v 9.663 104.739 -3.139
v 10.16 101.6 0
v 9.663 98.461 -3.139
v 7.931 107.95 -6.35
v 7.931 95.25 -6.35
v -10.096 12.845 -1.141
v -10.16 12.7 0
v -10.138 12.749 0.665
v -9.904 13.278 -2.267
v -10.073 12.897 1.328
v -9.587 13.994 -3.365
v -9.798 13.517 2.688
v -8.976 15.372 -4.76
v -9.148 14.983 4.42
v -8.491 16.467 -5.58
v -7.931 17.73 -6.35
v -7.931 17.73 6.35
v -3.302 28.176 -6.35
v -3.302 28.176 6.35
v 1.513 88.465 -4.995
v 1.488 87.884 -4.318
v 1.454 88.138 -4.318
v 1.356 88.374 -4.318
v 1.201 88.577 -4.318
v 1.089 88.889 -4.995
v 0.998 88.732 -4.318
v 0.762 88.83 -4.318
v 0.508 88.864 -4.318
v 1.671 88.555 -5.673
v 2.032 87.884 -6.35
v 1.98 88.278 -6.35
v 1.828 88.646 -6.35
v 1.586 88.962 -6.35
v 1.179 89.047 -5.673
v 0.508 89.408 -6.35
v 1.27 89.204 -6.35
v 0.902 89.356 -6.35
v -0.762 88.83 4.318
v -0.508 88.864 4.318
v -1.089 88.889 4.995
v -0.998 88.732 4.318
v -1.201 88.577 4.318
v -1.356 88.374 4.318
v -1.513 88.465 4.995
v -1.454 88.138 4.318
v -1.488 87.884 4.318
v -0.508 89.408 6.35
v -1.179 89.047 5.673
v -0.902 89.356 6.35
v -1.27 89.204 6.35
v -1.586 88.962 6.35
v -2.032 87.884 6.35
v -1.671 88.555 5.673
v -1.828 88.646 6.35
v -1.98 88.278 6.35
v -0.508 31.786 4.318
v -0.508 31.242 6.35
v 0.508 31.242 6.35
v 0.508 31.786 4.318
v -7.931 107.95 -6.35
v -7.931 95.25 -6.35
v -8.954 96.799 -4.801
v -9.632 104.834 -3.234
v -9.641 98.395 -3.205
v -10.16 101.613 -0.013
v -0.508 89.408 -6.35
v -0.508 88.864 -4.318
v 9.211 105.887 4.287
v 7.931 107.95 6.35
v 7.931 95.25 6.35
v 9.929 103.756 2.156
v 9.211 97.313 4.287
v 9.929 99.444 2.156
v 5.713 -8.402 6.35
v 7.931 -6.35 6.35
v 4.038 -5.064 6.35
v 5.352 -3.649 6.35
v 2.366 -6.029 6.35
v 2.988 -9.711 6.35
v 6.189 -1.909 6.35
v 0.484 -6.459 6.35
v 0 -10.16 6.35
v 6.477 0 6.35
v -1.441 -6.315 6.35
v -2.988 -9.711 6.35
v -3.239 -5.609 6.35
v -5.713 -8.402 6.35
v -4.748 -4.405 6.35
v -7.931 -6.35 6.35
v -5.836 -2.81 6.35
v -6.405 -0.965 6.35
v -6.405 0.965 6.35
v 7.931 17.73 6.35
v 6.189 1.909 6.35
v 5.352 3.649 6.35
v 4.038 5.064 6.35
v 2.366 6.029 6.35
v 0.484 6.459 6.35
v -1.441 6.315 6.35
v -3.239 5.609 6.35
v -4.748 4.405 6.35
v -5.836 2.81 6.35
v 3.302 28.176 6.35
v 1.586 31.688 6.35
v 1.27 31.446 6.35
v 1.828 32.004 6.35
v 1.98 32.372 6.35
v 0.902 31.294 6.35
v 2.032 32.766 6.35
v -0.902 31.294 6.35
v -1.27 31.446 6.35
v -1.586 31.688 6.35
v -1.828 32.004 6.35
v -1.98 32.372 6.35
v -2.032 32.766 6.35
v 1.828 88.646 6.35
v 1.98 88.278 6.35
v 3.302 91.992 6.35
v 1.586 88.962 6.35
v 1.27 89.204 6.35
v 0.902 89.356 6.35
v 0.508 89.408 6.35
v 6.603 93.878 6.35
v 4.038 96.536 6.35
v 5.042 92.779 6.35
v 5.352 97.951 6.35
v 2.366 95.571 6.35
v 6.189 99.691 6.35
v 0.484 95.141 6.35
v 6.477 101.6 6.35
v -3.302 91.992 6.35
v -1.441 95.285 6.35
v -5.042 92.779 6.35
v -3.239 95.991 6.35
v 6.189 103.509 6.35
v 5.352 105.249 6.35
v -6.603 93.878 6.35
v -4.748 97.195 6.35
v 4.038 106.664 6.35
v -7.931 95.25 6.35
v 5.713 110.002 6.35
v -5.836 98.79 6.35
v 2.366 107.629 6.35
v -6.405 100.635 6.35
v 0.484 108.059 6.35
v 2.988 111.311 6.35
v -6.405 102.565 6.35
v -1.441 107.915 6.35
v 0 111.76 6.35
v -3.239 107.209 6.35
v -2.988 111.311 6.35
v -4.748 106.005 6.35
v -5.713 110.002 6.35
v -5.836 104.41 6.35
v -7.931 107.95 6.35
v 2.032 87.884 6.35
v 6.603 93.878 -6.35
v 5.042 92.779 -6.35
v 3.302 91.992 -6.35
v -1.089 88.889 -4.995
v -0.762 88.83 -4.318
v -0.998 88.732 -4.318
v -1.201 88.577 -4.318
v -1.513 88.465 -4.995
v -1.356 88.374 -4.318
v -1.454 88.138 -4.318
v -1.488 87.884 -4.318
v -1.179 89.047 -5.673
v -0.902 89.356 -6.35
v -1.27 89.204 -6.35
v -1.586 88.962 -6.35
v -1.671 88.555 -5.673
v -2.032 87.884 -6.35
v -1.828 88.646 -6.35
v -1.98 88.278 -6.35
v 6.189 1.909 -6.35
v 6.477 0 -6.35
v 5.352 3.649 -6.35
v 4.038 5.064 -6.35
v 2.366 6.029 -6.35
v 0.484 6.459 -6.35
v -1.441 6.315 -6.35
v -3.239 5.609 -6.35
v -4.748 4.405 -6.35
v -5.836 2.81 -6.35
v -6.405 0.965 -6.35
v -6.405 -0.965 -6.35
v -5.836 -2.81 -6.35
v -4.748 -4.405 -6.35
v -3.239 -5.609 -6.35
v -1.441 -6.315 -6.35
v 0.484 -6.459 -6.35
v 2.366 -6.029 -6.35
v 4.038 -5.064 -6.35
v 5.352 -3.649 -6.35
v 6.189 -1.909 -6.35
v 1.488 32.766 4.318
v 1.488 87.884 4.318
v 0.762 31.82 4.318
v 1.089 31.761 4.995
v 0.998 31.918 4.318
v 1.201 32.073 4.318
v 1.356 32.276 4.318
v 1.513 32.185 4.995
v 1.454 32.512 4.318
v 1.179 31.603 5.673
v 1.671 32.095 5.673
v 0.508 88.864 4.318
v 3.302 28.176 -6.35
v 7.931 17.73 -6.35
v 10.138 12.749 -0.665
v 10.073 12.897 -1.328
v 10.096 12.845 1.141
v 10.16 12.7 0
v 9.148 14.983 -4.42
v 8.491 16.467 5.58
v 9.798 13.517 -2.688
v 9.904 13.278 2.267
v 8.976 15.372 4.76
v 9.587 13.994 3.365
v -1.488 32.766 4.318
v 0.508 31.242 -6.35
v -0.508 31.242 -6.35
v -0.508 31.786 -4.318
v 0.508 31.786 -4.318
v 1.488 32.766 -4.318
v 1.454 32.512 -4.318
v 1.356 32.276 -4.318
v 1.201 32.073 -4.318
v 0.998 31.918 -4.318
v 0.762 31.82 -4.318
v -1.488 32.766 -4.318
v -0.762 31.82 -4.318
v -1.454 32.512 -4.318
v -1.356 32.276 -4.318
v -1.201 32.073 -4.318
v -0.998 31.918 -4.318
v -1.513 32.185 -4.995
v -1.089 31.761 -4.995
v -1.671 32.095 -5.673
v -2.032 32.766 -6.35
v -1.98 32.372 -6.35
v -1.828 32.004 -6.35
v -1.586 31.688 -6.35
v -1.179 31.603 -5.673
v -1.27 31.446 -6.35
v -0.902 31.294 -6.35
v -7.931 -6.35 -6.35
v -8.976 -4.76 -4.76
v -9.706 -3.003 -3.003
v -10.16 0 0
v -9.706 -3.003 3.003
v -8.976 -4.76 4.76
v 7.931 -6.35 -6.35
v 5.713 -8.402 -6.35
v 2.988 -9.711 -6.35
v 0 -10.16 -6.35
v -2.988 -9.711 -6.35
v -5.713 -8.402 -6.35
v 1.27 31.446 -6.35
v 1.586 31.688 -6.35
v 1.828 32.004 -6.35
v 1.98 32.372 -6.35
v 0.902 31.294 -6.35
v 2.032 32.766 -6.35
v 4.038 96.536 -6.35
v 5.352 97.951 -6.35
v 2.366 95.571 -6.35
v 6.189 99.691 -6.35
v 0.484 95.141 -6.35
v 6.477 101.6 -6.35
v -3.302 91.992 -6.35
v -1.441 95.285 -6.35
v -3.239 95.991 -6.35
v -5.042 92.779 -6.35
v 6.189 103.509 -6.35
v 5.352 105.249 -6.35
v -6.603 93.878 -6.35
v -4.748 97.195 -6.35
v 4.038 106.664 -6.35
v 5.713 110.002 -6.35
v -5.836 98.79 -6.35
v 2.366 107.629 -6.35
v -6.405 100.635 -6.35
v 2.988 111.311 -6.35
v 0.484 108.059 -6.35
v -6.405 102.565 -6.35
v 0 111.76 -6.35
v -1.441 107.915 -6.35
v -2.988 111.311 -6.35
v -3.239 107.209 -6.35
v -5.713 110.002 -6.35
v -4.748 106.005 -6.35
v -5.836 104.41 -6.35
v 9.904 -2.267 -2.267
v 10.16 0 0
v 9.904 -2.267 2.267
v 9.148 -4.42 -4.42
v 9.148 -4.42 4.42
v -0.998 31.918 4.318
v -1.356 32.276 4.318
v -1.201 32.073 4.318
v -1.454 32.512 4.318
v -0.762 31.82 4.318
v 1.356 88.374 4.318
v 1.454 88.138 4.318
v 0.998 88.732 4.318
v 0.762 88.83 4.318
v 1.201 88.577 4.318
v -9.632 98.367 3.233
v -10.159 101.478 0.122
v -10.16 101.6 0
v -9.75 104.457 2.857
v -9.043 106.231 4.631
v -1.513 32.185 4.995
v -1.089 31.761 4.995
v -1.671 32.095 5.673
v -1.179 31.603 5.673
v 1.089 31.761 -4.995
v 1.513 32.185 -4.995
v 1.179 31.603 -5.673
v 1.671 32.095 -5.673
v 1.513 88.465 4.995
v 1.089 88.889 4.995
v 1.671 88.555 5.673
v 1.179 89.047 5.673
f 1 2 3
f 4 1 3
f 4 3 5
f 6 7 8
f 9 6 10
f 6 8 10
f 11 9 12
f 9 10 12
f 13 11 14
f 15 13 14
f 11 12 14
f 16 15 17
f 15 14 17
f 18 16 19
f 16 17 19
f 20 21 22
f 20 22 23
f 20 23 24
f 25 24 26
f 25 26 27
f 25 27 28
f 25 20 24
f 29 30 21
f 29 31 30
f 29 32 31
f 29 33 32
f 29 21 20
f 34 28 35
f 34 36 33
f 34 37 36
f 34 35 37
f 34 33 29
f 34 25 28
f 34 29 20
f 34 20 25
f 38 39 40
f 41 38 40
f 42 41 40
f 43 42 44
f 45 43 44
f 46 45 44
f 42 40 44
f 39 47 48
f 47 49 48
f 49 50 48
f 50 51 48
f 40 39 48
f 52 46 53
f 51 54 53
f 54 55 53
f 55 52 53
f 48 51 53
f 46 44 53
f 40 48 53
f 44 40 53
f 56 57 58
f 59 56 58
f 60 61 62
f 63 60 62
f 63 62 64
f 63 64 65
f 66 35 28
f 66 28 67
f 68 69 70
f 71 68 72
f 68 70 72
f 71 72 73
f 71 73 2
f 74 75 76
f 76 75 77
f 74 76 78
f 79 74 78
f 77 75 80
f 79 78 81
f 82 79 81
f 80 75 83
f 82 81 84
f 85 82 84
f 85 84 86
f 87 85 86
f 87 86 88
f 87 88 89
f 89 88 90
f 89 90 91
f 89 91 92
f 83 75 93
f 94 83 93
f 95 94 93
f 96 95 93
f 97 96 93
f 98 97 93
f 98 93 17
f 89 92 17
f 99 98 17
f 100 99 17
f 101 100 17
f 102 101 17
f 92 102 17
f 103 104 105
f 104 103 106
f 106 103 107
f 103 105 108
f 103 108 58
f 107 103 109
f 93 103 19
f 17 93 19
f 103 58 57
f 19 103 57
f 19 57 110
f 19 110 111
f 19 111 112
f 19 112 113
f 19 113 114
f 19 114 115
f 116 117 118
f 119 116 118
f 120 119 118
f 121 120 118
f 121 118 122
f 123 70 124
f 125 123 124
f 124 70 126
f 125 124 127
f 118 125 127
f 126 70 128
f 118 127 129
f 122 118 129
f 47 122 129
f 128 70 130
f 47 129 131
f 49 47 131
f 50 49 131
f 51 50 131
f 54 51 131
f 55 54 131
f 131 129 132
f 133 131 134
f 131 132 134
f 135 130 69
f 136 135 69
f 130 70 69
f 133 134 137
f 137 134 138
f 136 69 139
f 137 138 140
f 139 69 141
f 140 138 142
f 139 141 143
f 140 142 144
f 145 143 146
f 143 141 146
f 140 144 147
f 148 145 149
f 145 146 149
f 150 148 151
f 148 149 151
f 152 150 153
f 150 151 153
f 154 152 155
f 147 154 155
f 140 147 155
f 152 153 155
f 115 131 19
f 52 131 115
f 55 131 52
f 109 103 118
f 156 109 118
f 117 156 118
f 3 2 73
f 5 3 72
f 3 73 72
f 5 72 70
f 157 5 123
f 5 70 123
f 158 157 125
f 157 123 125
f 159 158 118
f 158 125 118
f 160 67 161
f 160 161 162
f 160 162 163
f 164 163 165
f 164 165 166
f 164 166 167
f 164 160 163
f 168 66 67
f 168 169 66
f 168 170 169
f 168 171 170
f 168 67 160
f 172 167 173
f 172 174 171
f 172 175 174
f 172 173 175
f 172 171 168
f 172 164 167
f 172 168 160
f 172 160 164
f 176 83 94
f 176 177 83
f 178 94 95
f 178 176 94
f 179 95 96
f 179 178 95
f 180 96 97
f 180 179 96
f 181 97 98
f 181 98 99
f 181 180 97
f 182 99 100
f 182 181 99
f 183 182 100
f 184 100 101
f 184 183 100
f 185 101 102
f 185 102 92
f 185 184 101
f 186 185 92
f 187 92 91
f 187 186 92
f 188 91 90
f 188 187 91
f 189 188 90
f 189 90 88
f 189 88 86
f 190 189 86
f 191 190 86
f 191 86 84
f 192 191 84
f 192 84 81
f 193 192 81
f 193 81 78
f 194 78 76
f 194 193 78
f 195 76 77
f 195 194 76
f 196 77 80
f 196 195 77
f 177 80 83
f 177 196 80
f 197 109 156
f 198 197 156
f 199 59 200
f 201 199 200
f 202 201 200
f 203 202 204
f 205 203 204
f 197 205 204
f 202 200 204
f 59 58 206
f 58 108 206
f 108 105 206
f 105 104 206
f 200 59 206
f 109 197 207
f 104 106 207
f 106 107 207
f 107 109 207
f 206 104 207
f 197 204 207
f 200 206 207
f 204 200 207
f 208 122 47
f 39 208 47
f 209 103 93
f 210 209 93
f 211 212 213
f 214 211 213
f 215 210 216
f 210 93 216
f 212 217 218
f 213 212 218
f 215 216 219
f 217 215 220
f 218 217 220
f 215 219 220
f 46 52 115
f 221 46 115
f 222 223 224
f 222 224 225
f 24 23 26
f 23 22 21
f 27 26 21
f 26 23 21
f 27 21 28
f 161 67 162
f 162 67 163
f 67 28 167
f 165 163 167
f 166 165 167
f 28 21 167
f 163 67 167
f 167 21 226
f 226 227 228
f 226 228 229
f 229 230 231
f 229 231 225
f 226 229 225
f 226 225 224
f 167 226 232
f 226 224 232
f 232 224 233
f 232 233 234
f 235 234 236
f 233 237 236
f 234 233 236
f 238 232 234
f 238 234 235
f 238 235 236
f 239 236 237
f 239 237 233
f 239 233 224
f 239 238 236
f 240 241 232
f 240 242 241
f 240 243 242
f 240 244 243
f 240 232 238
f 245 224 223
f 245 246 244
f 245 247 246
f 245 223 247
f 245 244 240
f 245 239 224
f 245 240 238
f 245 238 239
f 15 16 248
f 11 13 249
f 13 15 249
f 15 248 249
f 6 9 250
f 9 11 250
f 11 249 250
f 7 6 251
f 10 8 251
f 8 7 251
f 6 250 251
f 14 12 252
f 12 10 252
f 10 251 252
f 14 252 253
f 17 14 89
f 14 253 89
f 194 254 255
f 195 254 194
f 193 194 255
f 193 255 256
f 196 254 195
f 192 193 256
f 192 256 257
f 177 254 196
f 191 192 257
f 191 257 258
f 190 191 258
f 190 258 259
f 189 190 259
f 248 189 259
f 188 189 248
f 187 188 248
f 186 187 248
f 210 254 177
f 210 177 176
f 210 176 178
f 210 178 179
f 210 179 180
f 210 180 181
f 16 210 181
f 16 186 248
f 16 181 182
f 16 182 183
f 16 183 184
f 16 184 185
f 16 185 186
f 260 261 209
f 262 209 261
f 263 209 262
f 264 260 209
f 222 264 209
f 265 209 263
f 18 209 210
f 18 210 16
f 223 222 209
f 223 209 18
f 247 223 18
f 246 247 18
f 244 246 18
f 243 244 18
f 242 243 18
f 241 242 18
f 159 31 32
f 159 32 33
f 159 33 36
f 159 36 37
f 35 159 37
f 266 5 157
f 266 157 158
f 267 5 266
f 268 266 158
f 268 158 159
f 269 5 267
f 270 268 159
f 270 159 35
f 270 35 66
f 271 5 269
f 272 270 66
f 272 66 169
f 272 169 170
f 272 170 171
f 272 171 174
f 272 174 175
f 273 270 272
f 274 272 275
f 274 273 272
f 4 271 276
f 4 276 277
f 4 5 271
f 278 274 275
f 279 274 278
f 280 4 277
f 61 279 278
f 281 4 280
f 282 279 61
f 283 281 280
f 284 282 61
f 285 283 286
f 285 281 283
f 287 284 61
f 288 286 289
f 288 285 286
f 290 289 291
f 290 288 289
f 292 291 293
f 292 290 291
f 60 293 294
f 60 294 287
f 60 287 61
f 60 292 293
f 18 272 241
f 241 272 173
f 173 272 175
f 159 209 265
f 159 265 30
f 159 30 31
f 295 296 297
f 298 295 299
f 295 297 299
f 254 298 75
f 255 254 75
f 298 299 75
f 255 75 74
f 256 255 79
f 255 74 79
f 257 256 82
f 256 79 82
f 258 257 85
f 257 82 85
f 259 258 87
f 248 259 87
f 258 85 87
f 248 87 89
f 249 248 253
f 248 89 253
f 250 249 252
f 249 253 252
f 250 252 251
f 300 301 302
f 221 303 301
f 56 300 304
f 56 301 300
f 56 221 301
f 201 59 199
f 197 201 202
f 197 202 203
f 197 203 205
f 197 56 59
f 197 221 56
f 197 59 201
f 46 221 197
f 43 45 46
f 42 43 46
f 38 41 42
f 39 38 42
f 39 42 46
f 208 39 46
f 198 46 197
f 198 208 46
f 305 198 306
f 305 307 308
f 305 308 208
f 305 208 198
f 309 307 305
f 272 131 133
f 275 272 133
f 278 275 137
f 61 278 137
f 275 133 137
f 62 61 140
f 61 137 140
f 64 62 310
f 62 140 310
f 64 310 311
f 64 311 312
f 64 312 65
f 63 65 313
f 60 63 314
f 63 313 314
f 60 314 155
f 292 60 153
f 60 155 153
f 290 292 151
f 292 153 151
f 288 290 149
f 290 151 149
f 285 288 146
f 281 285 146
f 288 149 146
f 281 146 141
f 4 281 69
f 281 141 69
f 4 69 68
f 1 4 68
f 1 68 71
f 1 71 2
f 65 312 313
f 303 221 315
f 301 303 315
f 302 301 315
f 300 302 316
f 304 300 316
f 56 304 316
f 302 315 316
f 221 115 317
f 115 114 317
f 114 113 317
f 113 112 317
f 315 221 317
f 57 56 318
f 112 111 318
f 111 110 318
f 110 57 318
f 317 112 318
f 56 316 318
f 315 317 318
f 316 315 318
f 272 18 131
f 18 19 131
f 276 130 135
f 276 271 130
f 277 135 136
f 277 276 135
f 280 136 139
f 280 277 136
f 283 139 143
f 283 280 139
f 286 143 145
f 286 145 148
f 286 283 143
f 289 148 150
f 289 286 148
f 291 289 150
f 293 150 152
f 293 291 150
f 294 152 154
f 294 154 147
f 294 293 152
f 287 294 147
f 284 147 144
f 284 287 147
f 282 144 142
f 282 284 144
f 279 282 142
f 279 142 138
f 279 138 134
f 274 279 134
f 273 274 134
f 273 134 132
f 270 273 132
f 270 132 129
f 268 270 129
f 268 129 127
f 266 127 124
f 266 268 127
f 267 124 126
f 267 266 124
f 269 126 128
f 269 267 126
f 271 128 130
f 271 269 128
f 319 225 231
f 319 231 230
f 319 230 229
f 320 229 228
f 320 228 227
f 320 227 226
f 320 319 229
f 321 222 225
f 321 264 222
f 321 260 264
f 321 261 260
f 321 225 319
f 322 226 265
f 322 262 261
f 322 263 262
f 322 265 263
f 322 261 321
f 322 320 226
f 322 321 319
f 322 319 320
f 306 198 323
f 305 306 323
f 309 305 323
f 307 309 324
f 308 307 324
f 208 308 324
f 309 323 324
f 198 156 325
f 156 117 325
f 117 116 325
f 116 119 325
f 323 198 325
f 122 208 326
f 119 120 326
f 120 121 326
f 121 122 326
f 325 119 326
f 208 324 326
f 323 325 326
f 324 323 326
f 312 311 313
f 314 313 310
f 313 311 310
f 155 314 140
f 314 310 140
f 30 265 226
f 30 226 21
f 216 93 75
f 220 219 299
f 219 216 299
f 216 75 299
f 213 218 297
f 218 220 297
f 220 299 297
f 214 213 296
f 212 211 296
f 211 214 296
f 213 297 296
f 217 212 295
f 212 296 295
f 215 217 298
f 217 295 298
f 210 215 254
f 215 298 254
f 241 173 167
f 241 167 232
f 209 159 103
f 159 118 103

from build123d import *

# Parameters (mm, degrees)
SKETCH1_R               = 6.477
BOSS_EXTRUDE1_DEPTH     = 6.35
CUT_EXTRUDE4_START      = 6.35
CUT_EXTRUDE4_DEPTH      = 2.032
CUT_EXTRUDE4_DRAFT      = -15
MIRROR1_START           = 6.35
MIRROR1_COPY_1_DEPTH    = 2.032
MIRROR1_COPY_1_DRAFT    = -15
CUT_EXTRUDE5_DEPTH      = 113.400381227
CUT_EXTRUDE5_DEPTH_BACK = 113.400381227
SKETCH3_OUTSIDE_W       = 47.17
SKETCH3_OUTSIDE_H       = 39.55
SKETCH3_OUTSIDE_R       = 10.16


with BuildPart() as part:
    # Sketch1 → Boss-Extrude1 (new, symmetric)
    with BuildSketch(Plane.XY):
        with BuildLine():
            Line((-10.16, 0), (-10.16, 12.7))
            Line((-10.16, 12.7), (-3.302, 28.175956627))
            Line((-3.302, 28.175956627), (-3.302, 91.991545598))
            ThreePointArc((-3.302, 91.991545598), (0, 111.76), (3.302, 91.991545598))
            Line((3.302, 91.991545598), (3.302, 28.175956627))
            Line((3.302, 28.175956627), (10.16, 12.7))
            Line((10.16, 12.7), (10.16, 0))
            ThreePointArc((10.16, 0), (0, -10.16), (-10.16, 0))
        make_face()
        Circle(SKETCH1_R, mode=Mode.SUBTRACT)
        with Locations((0, 101.6)):
            Circle(SKETCH1_R, mode=Mode.SUBTRACT)
    extrude(amount=BOSS_EXTRUDE1_DEPTH, both=True)


with BuildPart() as cut_extrude4_tool:
    # Sketch2 → Cut-Extrude4 (with draft: the straight prism first)
    with BuildSketch(Plane.XY.offset(CUT_EXTRUDE4_START)):
        with BuildLine():
            ThreePointArc((0.508, 31.242), (1.585630735, 31.688369265), (2.032, 32.766))
            Line((2.032, 32.766), (2.032, 87.884))
            ThreePointArc((2.032, 87.884), (1.585630735, 88.961630735), (0.508, 89.408))
            Line((0.508, 89.408), (-0.508, 89.408))
            ThreePointArc((-0.508, 89.408), (-1.585630735, 88.961630735), (-2.032, 87.884))
            Line((-2.032, 87.884), (-2.032, 32.766))
            ThreePointArc((-2.032, 32.766), (-1.585630735, 31.688369265), (-0.508, 31.242))
            Line((-0.508, 31.242), (0.508, 31.242))
        make_face()
    extrude(amount=-CUT_EXTRUDE4_DEPTH)
    # Cut-Extrude4: the draft: its side faces are tilted about the plane it starts from
    cut_extrude4_sides = [cut_extrude4_tool.faces().sort_by_distance(p)[0] for p in [
        (-1.585630735, 31.688369265, 5.334),
        (0, 31.242, 5.334),
        (1.585630735, 31.688369265, 5.334),
        (2.032, 60.325, 5.334),
        (1.585630735, 88.961630735, 5.334),
        (0, 89.408, 5.334),
        (-1.585630735, 88.961630735, 5.334),
        (-2.032, 60.325, 5.334),
    ]]
    draft(cut_extrude4_sides, Plane.XY.offset(CUT_EXTRUDE4_START), CUT_EXTRUDE4_DRAFT)


with BuildPart() as part_1:
    add(part.part)

    # Cut-Extrude4: cut by cut_extrude4_tool
    add(cut_extrude4_tool.part, mode=Mode.SUBTRACT)


with BuildPart() as mirror1_copy_1_tool:
    # Mirror1 copy 1 sketch → Mirror1 copy 1 (with draft: the straight prism first)
    with BuildSketch(Plane(origin=(0, 0, 0), x_dir=(1, 0, 0), z_dir=(0, 0, -1)).offset(MIRROR1_START)):
        with BuildLine():
            ThreePointArc((0.508, -31.242), (1.585630735, -31.688369265), (2.032, -32.766))
            Line((2.032, -32.766), (2.032, -87.884))
            ThreePointArc((2.032, -87.884), (1.585630735, -88.961630735), (0.508, -89.408))
            Line((0.508, -89.408), (-0.508, -89.408))
            ThreePointArc((-0.508, -89.408), (-1.585630735, -88.961630735), (-2.032, -87.884))
            Line((-2.032, -87.884), (-2.032, -32.766))
            ThreePointArc((-2.032, -32.766), (-1.585630735, -31.688369265), (-0.508, -31.242))
            Line((-0.508, -31.242), (0.508, -31.242))
        make_face()
    extrude(amount=-MIRROR1_COPY_1_DEPTH)
    # Mirror1 copy 1: the draft: its side faces are tilted about the plane it starts from
    mirror1_copy_1_sides = [mirror1_copy_1_tool.faces().sort_by_distance(p)[0] for p in [
        (-1.585630735, 31.688369265, -5.334),
        (0, 31.242, -5.334),
        (1.585630735, 31.688369265, -5.334),
        (2.032, 60.325, -5.334),
        (1.585630735, 88.961630735, -5.334),
        (0, 89.408, -5.334),
        (-1.585630735, 88.961630735, -5.334),
        (-2.032, 60.325, -5.334),
    ]]
    draft(mirror1_copy_1_sides, Plane(origin=(0, 0, 0), x_dir=(1, 0, 0), z_dir=(0, 0, -1)).offset(MIRROR1_START), MIRROR1_COPY_1_DRAFT)


with BuildPart() as part_2:
    add(part_1.part)

    # Mirror1 copy 1: cut by mirror1_copy_1_tool
    add(mirror1_copy_1_tool.part, mode=Mode.SUBTRACT)

    # Sketch3 outside → Cut-Extrude5 (cut, two sides: drawn at the far end of the back side and taken through both)
    with BuildSketch(Plane(origin=(0, 0, 0), x_dir=(1, 0, 0), z_dir=(0, 1, 0)).offset(-CUT_EXTRUDE5_DEPTH_BACK)):
        Rectangle(SKETCH3_OUTSIDE_W, SKETCH3_OUTSIDE_H)
        Circle(SKETCH3_OUTSIDE_R, mode=Mode.SUBTRACT)
    extrude(amount=CUT_EXTRUDE5_DEPTH + CUT_EXTRUDE5_DEPTH_BACK, mode=Mode.SUBTRACT)


solid = part_2.part
